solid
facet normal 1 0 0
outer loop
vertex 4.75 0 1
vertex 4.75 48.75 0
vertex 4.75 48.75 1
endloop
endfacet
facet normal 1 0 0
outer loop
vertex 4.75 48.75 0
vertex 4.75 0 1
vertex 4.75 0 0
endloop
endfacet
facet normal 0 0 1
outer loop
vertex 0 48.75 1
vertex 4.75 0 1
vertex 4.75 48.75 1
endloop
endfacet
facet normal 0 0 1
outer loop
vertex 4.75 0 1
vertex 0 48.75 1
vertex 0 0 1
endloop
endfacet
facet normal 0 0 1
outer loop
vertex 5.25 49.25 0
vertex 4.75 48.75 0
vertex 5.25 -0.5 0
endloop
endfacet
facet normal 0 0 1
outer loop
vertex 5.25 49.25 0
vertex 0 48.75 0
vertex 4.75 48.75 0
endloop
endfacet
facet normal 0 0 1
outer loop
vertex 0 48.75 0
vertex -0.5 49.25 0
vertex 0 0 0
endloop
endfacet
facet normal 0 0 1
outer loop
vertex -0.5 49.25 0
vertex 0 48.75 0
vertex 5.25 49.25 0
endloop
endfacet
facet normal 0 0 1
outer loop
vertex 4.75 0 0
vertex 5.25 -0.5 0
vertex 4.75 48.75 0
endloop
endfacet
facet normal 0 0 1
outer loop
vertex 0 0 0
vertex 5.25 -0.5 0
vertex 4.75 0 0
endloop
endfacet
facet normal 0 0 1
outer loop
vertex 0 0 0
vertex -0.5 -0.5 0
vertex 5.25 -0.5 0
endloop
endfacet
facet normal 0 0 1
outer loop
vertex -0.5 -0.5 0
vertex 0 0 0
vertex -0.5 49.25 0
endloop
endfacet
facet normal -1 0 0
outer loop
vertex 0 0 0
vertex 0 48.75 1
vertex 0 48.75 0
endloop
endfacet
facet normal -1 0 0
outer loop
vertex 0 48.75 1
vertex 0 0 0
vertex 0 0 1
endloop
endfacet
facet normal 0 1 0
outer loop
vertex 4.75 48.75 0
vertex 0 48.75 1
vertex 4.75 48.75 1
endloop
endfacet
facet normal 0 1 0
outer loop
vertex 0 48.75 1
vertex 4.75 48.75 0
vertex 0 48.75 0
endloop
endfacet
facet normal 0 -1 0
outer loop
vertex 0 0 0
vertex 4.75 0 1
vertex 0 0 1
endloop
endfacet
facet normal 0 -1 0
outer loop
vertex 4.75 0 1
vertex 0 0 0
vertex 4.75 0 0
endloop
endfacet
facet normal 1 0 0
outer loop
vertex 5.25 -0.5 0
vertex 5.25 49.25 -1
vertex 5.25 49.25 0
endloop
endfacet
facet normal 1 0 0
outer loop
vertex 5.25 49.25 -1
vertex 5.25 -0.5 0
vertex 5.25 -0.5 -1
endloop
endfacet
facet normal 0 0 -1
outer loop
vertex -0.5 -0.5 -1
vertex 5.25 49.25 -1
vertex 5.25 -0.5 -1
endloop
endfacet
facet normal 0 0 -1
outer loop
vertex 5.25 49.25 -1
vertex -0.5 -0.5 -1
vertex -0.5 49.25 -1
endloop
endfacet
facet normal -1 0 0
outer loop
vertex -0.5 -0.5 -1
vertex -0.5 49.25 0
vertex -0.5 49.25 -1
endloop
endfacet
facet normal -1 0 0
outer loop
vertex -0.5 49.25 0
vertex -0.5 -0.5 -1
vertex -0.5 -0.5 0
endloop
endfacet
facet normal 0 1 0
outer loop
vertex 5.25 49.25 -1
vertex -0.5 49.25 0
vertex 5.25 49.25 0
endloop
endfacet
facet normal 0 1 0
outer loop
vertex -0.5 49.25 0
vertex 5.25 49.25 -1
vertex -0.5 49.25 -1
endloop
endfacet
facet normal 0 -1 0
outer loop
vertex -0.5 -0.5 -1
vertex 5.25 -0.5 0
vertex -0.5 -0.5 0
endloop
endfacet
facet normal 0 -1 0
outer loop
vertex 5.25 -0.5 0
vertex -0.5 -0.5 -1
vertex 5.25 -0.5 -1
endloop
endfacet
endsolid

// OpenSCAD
$fn=50;
enclosure_inner_length = 100;
enclosure_inner_width = 55;
enclosure_inner_depth = 45;

enclosure_thickness = 2;

cover_thickness = 2;

part = "enclosure"; // [enclosure:Enclosure, cover:Cover, both:Enclosure and Cover]

// print_part();
diffuser();

module diffuser() {
	cube([5-0.25, 49-0.25, 1]);
	translate([-0.5, -0.5, -1]) cube([5+1-0.25, 49-0.25+1, 1]);
}

module print_part() {
	if (part == "enclosure") {
		box2(enclosure_inner_length,enclosure_inner_width,enclosure_inner_depth,enclosure_thickness,enclosure_thickness/2-0.10,cover_thickness);
	} else if (part == "cover") {
		lid2(enclosure_inner_length,enclosure_inner_width,enclosure_inner_depth,enclosure_thickness,enclosure_thickness/2+0.10,cover_thickness);
	} else {
		both();
	}
}

module both() {

	box2(enclosure_inner_length,enclosure_inner_width,enclosure_inner_depth,enclosure_thickness,enclosure_thickness/2-0.10,cover_thickness);
	translate([0, 0, 20]) lid2(enclosure_inner_length,enclosure_inner_width,enclosure_inner_depth,enclosure_thickness,enclosure_thickness/2+0.10,cover_thickness);

}

module screws(in_x, in_y, in_z, shell) {

	sx = in_x/2 - 4;
	sy = in_y/2 - 4;
	sh = shell + in_z - 12;
	nh = shell + in_z - 4;

	translate([0,0,0]) {
		translate([sx , sy, sh]) cylinder(r=1.5, h = 15, $fn=32);
		translate([sx , -sy, sh ]) cylinder(r=1.5, h = 15, $fn=32);
		translate([-sx , sy, sh ]) cylinder(r=1.5, h = 15, $fn=32);
		translate([-sx , -sy, sh ]) cylinder(r=1.5, h = 15, $fn=32);
	
	
		translate([-sx , -sy, nh ]) rotate([0,0,-45]) 
			translate([-5.75/2, -5.6/2, -0.7]) cube ([5.75, 10, 2.8]);
		translate([sx , -sy, nh ]) rotate([0,0,45]) 
			translate([-5.75/2, -5.6/2, -0.7]) cube ([5.75, 10, 2.8]);
		translate([sx , sy, nh ]) rotate([0,0,90+45]) 
			translate([-5.75/2, -5.6/2, -0.7]) cube ([5.75, 10, 2.8]);
		translate([-sx , sy, nh ]) rotate([0,0,-90-45]) 
			translate([-5.75/2, -5.6/2, -0.7]) cube ([5.75, 10, 2.8]);
	}
}

module bottom(in_x, in_y, in_z, shell) {

	hull() {
   	 	translate([-in_x/2+shell, -in_y/2+shell, 0]) cylinder(r=shell*2,h=shell, $fn=32);
		translate([+in_x/2-shell, -in_y/2+shell, 0]) cylinder(r=shell*2,h=shell, $fn=32);
		translate([+in_x/2-shell, in_y/2-shell, 0]) cylinder(r=shell*2,h=shell, $fn=32);
		translate([-in_x/2+shell, in_y/2-shell, 0]) cylinder(r=shell*2,h=shell, $fn=32);
	}
}

module sides(in_x, in_y, in_z, shell) {
	translate([0,0,shell])
	difference() {
		hull() {
	   	 	translate([-in_x/2+shell, -in_y/2+shell, 0]) cylinder(r=shell*2,h=in_z, $fn=32);
			translate([+in_x/2-shell, -in_y/2+shell, 0]) cylinder(r=shell*2,h=in_z, $fn=32);
			translate([+in_x/2-shell, in_y/2-shell, 0]) cylinder(r=shell*2,h=in_z, $fn=32);
			translate([-in_x/2+shell, in_y/2-shell, 0]) cylinder(r=shell*2,h=in_z, $fn=32);
		}
	
		hull() {
	   	 	translate([-in_x/2+shell, -in_y/2+shell, 0]) cylinder(r=shell,h=in_z+1, $fn=32);
			translate([+in_x/2-shell, -in_y/2+shell, 0]) cylinder(r=shell,h=in_z+1, $fn=32);
			translate([+in_x/2-shell, in_y/2-shell, 0]) cylinder(r=shell,h=in_z+1, $fn=32);
			translate([-in_x/2+shell, in_y/2-shell, 0]) cylinder(r=shell,h=in_z+1, $fn=32);
		}
	}
	
	intersection() {
		translate([-in_x/2, -in_y/2, shell]) cube([in_x, in_y, in_z+2]);
		union() {
			translate([-in_x/2 , -in_y/2,shell + in_z -6]) cylinder(r=9, h = 6, $fn=64);
			translate([-in_x/2 , -in_y/2,shell + in_z -10]) cylinder(r1=3, r2=9, h = 4, $fn=64);
		
			translate([in_x/2 , -in_y/2, shell + in_z -6]) cylinder(r=9, h = 6, $fn=64);
			translate([in_x/2 , -in_y/2, shell + in_z -10]) cylinder(r1=3, r2=9, h = 4, $fn=64);
		
			translate([in_x/2 , in_y/2,  shell + in_z -6]) cylinder(r=9, h = 6, $fn=64);
			translate([in_x/2 , in_y/2,  shell + in_z -10]) cylinder(r1=3, r2=9, h = 4, $fn=64);
		
			translate([-in_x/2 , in_y/2, shell + in_z -6]) cylinder(r=9, h = 6, $fn=64);
			translate([-in_x/2 , in_y/2, shell + in_z -10]) cylinder(r1=3, r2=9, h = 4, $fn=64);
		}
	}
}

module lid_top_lip2(in_x, in_y, in_z, shell, top_lip, top_thickness) {

	cxm = -in_x/2 - (shell-top_lip);
	cxp = in_x/2 + (shell-top_lip);
	cym = -in_y/2 - (shell-top_lip);
	cyp = in_y/2 + (shell-top_lip);

	translate([0,0,shell+in_z])

	difference() {
	
		hull() {
	   	 	translate([-in_x/2+shell, -in_y/2+shell, 0]) cylinder(r=shell*2,h=top_thickness, $fn=32);
			translate([+in_x/2-shell, -in_y/2+shell, 0]) cylinder(r=shell*2,h=top_thickness, $fn=32);
			translate([+in_x/2-shell, in_y/2-shell, 0]) cylinder(r=shell*2,h=top_thickness, $fn=32);
			translate([-in_x/2+shell, in_y/2-shell, 0]) cylinder(r=shell*2,h=top_thickness, $fn=32);
		}
	
		
		translate([0, 0, -1]) linear_extrude(height = top_thickness + 2) polygon(points = [
			[cxm+5, cym],
			[cxm, cym+5],
			[cxm, cyp-5],
			[cxm+5, cyp],
			[cxp-5, cyp],
			[cxp, cyp-5],
			[cxp, cym+5],
			[cxp-5, cym]]);
	}
}

module lid2(in_x, in_y, in_z, shell, top_lip, top_thickness) {

	cxm = -in_x/2 - (shell-top_lip);
	cxp = in_x/2 + (shell-top_lip);
	cym = -in_y/2 - (shell-top_lip);
	cyp = in_y/2 + (shell-top_lip);	

	difference() {
		translate([0, 0, in_z+shell]) linear_extrude(height = top_thickness ) polygon(points = [
			[cxm+5, cym],
			[cxm, cym+5],
			[cxm, cyp-5],
			[cxm+5, cyp],
			[cxp-5, cyp],
			[cxp, cyp-5],
			[cxp, cym+5],
			[cxp-5, cym]]);
	
			screws(in_x, in_y, in_z, shell);
            // hole for 8x1 neopixel array
			translate([enclosure_inner_length/2 - 10 - 5, -49/2, 0]) cube([5, 49, 100]);
	}
}

module box2(in_x, in_y, in_z, shell, top_lip, top_thickness) {
	
	// bottom plate, with 12 holes for magnets
	difference() {
		union() {
			bottom(in_x, in_y, in_z, shell); // 2 mm bottom plate
			for(x=[0, 1, 2, 3]) {
				for (y=[-1, 0, 1]) {
					translate([15*x-30+15/2, 15*y, 1]) {
						cylinder(d=8.5+2*2, h=2.6);
					}
				}
			}
		}
		union() {
			for(x=[0, 1, 2, 3]) {
				for (y=[-1, 0, 1]) {
					translate([15*x-30+15/2, 15*y, 1]) {
						cylinder(d=8.5, h=2);
					}
				}
			}
		}
	}
	


	difference() {
        union() {
            sides(in_x, in_y, in_z, shell);
            lid_top_lip2(in_x, in_y, in_z, shell, top_lip, top_thickness);
        }
		
		screws(in_x, in_y, in_z, shell);
		// hole for antenna
		hole("length_1", 6.5/2, [0, 10]);

		// slit for USB cable
        offset = [0, enclosure_thickness+4.5/2];
        assign (
			rotate = [90,0,270], 
			translate_coords = [-(enclosure_thickness+1), offset[0], offset[1]], 
			length = enclosure_inner_length/2) {
				punch_hole([4.5/2, length], rotate, translate_coords, stretch=[0, 0, 50]);
		}
	}
	
}

module punch_hole(cylinder, rotate, translate_coords, stretch=[0, 0, 0]) {
    hull() {
        translate(translate_coords) rotate (rotate) cylinder (h = cylinder[1], r=cylinder[0], center = false, $fn=32);
        translate(translate_coords + stretch) rotate (rotate) cylinder (h = cylinder[1], r=cylinder[0], center = false, $fn=32);
    }
}

module hole(side, radius, offset) {
	// side is "[length/width]_[1/2]"
	// radius is hole radius
	// offset is [horizontal, height] from the [center, bottom] of the side, or from the [center, center] of the lid.

	if (side == "length_1") {
		assign (
			rotate = [90,0,90], 
			translate_coords = [enclosure_thickness+1, offset[0], offset[1]], 
			length = enclosure_inner_length/2) {
				punch_hole([radius, length], rotate, translate_coords);
		}
	}
	if (side == "length_2") {
		assign (
			rotate = [90,0,270], 
			translate_coords = [-(enclosure_thickness+1), offset[0], offset[1]], 
			length = enclosure_inner_length/2) {
				punch_hole([radius, length], rotate, translate_coords);
		}
	}
	if (side == "width_1") {
		assign (
			rotate = [90,0,0], 
			translate_coords = [offset[0], -(enclosure_thickness+1), offset[1]], 
			length = enclosure_inner_width/2) {
				punch_hole([radius, length], rotate, translate_coords);
		}
	}
	if (side == "width_2") {
		assign (
			rotate = [90,0,180], 
			translate_coords = [offset[0], enclosure_thickness+1, offset[1]], 
			length = enclosure_inner_width/2) {
				punch_hole([radius, length], rotate, translate_coords);
		}
	}
	if (side == "lid") {
		assign (
			rotate = [0,0,0], 
			translate_coords = [offset[0], offset[1], enclosure_inner_depth-cover_thickness], 
			length = enclosure_inner_depth/2) {
				punch_hole([radius, length], rotate, translate_coords);
		}
	}
}
